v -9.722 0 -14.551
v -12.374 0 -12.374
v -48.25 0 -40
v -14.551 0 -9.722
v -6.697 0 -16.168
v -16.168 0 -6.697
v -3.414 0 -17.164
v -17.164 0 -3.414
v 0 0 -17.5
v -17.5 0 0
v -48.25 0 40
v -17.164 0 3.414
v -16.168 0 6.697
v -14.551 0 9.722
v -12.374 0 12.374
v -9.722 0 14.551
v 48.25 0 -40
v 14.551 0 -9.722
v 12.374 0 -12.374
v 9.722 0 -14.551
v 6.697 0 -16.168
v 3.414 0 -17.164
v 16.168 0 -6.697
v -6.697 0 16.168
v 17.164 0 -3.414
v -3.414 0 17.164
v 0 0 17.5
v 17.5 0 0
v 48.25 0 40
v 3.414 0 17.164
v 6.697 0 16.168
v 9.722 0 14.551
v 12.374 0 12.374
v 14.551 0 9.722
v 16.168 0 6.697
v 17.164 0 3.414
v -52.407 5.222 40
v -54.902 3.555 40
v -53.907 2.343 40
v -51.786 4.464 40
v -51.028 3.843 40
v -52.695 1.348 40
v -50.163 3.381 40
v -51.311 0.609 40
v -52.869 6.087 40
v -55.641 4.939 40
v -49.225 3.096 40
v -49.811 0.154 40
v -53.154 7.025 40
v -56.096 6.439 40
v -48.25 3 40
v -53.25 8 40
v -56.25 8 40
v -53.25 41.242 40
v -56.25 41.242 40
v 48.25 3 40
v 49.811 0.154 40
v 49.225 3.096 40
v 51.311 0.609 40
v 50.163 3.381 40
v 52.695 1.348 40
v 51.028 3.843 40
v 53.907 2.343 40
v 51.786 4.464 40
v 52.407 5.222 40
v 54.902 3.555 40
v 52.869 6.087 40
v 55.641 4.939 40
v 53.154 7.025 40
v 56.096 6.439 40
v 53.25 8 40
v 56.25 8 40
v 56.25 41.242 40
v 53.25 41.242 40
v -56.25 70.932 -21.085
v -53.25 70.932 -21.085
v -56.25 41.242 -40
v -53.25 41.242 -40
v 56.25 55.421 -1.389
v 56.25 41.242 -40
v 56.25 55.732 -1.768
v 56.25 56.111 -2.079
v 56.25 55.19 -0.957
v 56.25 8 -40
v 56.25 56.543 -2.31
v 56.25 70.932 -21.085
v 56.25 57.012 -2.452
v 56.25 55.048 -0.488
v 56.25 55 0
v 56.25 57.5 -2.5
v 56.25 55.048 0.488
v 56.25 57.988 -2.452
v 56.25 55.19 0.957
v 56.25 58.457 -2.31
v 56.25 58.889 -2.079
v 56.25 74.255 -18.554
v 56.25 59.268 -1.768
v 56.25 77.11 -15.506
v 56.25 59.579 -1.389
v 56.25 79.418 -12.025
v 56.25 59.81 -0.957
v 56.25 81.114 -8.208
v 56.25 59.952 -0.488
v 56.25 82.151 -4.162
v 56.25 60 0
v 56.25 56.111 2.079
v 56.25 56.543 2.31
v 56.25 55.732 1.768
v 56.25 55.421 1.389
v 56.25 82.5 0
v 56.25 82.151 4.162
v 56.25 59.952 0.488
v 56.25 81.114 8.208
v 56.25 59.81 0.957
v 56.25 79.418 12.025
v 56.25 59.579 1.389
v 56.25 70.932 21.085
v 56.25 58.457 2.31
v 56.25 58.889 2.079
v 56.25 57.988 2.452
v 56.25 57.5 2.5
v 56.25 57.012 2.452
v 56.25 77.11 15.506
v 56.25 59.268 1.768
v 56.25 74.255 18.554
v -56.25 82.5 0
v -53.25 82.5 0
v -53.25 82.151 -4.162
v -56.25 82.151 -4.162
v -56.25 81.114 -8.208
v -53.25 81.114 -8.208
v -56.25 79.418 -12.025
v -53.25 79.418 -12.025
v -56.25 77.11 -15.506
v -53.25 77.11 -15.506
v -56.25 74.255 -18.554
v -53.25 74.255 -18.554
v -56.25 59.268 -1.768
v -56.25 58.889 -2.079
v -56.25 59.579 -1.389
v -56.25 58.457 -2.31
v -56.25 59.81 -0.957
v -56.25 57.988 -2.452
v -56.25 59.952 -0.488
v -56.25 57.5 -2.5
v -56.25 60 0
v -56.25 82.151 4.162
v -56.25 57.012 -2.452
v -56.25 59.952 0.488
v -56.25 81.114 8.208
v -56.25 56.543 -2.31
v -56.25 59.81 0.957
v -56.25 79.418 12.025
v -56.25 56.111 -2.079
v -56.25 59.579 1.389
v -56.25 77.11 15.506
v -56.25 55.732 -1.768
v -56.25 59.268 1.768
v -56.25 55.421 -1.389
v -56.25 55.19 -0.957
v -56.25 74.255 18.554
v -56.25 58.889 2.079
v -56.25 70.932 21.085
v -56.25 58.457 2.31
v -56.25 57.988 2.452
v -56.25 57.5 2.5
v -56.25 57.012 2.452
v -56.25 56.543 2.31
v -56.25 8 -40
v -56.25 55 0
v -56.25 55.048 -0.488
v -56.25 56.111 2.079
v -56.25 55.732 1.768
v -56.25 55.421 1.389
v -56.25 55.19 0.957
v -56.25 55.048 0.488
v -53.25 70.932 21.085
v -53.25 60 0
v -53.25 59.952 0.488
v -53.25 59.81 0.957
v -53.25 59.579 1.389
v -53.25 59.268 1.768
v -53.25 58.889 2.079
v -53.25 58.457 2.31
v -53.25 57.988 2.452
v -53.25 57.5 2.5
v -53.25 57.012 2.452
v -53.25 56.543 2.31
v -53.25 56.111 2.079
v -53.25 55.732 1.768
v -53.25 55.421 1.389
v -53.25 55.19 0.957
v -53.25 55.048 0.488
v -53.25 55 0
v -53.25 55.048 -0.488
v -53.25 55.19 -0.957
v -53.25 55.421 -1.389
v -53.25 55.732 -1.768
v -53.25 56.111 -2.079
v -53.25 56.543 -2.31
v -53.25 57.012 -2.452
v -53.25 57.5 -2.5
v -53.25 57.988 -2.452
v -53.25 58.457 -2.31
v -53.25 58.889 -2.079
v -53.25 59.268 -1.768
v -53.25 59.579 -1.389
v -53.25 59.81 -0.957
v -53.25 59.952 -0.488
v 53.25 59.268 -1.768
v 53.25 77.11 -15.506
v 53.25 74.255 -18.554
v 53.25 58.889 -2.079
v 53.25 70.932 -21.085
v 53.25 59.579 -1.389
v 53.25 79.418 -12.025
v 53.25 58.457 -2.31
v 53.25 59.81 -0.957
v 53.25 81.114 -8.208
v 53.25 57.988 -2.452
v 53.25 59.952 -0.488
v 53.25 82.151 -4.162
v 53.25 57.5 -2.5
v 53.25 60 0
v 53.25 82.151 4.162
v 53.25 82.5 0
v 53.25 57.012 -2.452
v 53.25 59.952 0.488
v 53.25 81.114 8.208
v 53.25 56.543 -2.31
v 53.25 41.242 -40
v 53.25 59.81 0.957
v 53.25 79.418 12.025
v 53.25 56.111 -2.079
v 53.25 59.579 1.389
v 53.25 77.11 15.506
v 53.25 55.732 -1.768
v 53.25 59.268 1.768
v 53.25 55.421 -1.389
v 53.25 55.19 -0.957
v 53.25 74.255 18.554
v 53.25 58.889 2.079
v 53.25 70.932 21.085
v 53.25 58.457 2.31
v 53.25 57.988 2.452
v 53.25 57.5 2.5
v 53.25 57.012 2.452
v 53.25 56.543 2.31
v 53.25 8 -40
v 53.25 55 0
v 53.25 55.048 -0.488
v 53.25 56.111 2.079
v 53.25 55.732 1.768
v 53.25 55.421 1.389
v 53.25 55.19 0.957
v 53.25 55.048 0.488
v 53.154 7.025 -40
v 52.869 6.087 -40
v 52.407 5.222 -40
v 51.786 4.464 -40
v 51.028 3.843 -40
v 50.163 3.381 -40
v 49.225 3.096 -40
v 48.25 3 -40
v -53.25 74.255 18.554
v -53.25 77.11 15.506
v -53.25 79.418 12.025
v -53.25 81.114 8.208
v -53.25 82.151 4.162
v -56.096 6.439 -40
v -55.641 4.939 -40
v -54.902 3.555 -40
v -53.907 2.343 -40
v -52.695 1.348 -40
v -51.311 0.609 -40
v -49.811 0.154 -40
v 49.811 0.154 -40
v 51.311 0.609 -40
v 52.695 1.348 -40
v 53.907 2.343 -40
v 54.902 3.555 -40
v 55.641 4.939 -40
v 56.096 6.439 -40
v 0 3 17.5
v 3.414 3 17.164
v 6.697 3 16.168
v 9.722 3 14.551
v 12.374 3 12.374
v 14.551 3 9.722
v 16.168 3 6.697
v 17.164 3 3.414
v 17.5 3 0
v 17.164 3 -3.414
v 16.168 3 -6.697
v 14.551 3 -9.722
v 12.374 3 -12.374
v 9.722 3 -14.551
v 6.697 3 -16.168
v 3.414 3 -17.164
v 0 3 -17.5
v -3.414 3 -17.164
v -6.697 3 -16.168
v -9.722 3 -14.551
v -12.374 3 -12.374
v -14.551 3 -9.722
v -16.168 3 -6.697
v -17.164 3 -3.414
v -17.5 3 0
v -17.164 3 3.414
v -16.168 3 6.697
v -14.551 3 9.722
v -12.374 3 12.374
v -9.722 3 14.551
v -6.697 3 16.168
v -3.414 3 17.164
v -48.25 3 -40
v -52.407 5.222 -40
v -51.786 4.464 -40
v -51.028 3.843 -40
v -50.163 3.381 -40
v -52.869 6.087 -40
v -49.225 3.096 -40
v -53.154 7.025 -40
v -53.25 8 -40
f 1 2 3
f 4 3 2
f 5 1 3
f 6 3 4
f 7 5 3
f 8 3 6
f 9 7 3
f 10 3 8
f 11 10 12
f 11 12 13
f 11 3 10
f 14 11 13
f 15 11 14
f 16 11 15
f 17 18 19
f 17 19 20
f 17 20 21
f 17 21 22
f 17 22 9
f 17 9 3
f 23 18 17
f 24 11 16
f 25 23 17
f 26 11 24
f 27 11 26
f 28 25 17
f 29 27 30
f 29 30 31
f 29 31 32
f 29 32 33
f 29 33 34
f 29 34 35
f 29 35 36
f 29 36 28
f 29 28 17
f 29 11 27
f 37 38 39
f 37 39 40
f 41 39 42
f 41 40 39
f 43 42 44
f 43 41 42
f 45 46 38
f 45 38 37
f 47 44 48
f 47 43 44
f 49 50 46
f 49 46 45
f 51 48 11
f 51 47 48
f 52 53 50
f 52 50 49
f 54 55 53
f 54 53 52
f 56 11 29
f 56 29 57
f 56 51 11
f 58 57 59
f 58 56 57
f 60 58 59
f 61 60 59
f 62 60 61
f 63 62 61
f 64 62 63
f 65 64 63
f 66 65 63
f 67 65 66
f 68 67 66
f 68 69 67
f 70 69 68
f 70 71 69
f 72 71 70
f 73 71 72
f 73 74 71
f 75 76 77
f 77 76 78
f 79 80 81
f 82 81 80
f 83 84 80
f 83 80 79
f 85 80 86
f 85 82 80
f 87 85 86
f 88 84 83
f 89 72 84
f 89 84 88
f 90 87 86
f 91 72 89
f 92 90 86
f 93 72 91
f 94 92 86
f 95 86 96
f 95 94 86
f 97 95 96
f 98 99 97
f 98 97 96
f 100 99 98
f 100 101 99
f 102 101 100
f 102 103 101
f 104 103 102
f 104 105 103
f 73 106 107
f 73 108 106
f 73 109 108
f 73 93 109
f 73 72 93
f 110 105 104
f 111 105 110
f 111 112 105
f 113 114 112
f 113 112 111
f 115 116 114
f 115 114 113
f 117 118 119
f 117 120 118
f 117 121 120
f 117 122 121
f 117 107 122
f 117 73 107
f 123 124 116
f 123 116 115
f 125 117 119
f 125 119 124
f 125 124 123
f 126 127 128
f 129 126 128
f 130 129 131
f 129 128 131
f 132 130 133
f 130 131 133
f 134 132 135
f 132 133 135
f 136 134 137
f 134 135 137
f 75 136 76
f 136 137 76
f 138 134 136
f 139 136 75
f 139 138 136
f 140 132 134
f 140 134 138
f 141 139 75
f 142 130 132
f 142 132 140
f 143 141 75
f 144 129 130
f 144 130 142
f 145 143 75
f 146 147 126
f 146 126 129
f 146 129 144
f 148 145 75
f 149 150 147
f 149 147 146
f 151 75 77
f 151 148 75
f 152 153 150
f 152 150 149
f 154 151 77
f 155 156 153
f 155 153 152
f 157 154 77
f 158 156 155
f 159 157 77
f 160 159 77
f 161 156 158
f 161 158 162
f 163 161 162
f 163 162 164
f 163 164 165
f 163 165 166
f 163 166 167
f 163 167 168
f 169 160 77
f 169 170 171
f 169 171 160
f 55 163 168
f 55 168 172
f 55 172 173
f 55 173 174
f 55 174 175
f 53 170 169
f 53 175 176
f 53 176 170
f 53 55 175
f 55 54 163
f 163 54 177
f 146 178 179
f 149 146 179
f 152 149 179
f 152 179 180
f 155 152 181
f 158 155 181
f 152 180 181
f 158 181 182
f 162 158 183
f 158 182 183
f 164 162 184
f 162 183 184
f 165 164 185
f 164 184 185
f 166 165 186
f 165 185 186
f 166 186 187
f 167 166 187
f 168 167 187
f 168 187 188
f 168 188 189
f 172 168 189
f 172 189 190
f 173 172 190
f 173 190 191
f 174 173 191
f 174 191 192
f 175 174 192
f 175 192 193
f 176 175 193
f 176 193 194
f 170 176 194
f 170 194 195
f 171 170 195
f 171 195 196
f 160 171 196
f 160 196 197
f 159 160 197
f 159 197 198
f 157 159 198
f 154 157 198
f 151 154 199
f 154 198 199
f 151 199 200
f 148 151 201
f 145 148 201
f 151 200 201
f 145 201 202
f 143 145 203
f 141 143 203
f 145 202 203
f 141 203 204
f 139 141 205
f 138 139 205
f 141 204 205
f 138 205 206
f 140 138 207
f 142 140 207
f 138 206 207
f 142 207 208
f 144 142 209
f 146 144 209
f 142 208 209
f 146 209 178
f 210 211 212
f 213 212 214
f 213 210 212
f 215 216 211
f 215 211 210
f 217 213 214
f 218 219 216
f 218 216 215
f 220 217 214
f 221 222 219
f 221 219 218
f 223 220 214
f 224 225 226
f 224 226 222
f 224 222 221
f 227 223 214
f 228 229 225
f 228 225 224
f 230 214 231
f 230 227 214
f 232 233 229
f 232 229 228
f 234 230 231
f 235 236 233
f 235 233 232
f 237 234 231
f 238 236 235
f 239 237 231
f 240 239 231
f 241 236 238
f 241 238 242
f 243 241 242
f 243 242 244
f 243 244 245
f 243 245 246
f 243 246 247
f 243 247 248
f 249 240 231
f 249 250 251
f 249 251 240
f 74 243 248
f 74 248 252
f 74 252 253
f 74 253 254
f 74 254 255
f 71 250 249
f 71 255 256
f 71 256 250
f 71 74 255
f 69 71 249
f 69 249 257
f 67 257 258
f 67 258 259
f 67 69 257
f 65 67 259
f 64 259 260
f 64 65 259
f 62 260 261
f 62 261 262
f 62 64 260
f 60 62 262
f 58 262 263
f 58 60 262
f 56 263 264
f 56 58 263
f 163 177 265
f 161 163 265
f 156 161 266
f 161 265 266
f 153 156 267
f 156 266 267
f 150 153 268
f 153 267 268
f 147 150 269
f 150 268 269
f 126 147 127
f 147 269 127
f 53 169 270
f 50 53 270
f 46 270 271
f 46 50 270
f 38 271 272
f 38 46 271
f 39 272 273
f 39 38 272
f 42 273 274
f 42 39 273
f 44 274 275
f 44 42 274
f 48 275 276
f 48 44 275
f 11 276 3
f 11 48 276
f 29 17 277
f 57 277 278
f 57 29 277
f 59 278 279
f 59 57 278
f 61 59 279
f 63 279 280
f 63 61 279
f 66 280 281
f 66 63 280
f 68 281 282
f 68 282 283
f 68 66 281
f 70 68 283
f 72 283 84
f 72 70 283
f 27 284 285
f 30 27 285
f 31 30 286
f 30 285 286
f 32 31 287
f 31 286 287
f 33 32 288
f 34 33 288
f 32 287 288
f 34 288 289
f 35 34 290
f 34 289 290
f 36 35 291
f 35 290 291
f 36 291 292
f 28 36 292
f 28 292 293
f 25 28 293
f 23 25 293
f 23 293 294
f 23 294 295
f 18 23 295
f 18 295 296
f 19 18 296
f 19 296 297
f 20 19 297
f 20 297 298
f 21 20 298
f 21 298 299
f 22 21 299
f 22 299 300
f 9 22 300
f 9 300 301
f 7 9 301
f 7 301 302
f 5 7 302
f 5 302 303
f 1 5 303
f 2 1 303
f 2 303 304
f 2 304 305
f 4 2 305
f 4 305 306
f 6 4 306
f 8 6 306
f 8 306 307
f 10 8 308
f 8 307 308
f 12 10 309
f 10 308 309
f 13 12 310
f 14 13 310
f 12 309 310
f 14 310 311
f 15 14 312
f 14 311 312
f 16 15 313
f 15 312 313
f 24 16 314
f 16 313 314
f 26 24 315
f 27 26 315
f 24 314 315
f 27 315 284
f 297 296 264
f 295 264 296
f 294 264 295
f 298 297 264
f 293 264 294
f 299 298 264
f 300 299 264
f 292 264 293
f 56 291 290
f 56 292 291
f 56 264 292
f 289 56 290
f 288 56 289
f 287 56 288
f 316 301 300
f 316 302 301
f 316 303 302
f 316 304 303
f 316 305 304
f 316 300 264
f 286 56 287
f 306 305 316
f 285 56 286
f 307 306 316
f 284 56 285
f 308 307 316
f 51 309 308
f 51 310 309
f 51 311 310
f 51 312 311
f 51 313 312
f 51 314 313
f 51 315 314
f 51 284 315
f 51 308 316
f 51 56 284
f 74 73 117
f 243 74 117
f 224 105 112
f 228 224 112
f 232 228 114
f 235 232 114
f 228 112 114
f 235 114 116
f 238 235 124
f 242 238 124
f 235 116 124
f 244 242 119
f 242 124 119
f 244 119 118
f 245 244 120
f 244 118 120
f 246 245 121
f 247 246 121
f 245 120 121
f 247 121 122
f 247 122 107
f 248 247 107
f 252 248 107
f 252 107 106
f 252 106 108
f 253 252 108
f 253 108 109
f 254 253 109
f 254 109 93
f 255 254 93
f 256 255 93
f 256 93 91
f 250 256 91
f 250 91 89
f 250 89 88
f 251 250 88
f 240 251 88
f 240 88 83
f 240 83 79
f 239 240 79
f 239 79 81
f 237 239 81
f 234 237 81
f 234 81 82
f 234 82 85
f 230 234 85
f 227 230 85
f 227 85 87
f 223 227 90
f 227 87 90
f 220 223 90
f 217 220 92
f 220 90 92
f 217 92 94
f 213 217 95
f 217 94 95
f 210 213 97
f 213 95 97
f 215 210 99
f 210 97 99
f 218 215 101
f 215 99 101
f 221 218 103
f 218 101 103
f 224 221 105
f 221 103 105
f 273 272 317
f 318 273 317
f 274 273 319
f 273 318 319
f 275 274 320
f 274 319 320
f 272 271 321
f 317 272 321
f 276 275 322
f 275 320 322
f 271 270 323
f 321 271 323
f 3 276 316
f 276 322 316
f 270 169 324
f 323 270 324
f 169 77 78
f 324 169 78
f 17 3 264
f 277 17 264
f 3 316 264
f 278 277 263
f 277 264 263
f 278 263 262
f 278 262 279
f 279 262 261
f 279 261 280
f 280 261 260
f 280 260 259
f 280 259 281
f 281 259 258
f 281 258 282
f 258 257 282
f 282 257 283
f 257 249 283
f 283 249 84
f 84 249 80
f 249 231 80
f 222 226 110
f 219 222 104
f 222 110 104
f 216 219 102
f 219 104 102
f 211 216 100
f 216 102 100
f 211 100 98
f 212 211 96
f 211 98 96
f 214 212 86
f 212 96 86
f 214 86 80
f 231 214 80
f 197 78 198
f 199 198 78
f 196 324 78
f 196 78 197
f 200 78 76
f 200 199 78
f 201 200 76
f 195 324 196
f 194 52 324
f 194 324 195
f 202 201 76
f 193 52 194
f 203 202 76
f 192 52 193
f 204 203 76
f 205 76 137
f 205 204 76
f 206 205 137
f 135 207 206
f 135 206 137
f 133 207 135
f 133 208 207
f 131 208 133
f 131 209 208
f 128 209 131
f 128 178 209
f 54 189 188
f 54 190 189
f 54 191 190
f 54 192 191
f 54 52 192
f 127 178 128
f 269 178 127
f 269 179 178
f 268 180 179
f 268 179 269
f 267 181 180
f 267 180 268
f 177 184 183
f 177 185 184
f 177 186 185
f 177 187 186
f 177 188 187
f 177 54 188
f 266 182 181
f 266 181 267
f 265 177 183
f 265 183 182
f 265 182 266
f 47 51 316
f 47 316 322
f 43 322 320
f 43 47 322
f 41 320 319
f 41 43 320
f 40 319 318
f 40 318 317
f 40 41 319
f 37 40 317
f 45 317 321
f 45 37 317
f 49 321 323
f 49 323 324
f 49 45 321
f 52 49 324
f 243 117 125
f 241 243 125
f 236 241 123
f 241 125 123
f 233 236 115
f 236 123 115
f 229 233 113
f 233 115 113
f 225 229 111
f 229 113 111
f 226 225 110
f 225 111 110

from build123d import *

# Parameters (mm, degrees)
EXTRU_MINCE1_DEPTH      = 40
ENL_V_MAT_EXTRU_1_REACH = 107.282
ESQUISSE2_R             = 17.5
ENL_V_MAT_EXTRU_2_DEPTH = 146.129252737
ESQUISSE4_R             = 2.5
ENL_V_MAT_EXTRU_3_DEPTH = 146.129252737


with BuildPart() as part:
    # Esquisse1 → Extru.-Mince1 (new, symmetric)
    with BuildSketch(Plane.XY):
        with BuildLine():
            Line((-56.25, 82.5), (-56.25, 8))
            ThreePointArc((-56.25, 8), (-53.906854249, 2.343145751), (-48.25, 0))
            Line((-48.25, 0), (48.25, 0))
            ThreePointArc((48.25, 0), (53.906854249, 2.343145751), (56.25, 8))
            Line((56.25, 8), (56.25, 82.5))
            Line((56.25, 82.5), (53.25, 82.5))
            Line((53.25, 82.5), (53.25, 8))
            ThreePointArc((53.25, 8), (51.785533906, 4.464466094), (48.25, 3))
            Line((48.25, 3), (-48.25, 3))
            ThreePointArc((-48.25, 3), (-51.785533906, 4.464466094), (-53.25, 8))
            Line((-53.25, 8), (-53.25, 82.5))
            Line((-53.25, 82.5), (-56.25, 82.5))
        make_face()
    extrude(amount=EXTRU_MINCE1_DEPTH, both=True)

    # Esquisse2 → Enlèv. mat.-Extru.1 (cut, up to next)
    with BuildSketch(Plane(origin=(0, 3, 0), x_dir=(-1, 0, 0), z_dir=(0, 1, 0)), mode=Mode.PRIVATE) as enl_v_mat_extru_1_sk1:
        with Locations(Location((0, 0, 0), (0, 0, 90))):
            Circle(ESQUISSE2_R)
    enl_v_mat_extru_1_tool1 = extrude(enl_v_mat_extru_1_sk1.sketch, amount=-ENL_V_MAT_EXTRU_1_REACH, mode=Mode.PRIVATE) & part.part
    add(enl_v_mat_extru_1_tool1.solids().sort_by_distance((0, 3, 0))[0], mode=Mode.SUBTRACT)

    # Esquisse3 → Enlèv. mat.-Extru.2 (cut, through all)
    with BuildSketch(Plane(origin=(56.25, 0, 0), x_dir=(0, 0, -1), z_dir=(1, 0, 0))):
        with BuildLine():
            Line((-40, 41.241551833), (-21.084786145, 70.932490209))
            ThreePointArc((-21.084786145, 70.932490209), (-12.024719175, 79.418168919), (1.1e-07, 82.5))
            Line((1.1e-07, 82.5), (-40, 82.5))
            Line((-40, 82.5), (-40, 41.241551833))
        make_face()
        with BuildLine():
            Line((40, 82.5), (1.1e-07, 82.5))
            ThreePointArc((1.1e-07, 82.5), (12.024719271, 79.418168866), (21.084786145, 70.932490209))
            Line((21.084786145, 70.932490209), (40, 41.241551833))
            Line((40, 41.241551833), (40, 82.5))
        make_face()
    extrude(amount=-ENL_V_MAT_EXTRU_2_DEPTH, mode=Mode.SUBTRACT)

    # Esquisse4 → Enlèv. mat.-Extru.3 (cut, through all)
    with BuildSketch(Plane(origin=(56.25, 0, 0), x_dir=(0, 0, -1), z_dir=(1, 0, 0))):
        with Locations(Location((0, 57.5, 0), (0, 0, 90))):
            Circle(ESQUISSE4_R)
    extrude(amount=-ENL_V_MAT_EXTRU_3_DEPTH, mode=Mode.SUBTRACT)


solid = part.part
